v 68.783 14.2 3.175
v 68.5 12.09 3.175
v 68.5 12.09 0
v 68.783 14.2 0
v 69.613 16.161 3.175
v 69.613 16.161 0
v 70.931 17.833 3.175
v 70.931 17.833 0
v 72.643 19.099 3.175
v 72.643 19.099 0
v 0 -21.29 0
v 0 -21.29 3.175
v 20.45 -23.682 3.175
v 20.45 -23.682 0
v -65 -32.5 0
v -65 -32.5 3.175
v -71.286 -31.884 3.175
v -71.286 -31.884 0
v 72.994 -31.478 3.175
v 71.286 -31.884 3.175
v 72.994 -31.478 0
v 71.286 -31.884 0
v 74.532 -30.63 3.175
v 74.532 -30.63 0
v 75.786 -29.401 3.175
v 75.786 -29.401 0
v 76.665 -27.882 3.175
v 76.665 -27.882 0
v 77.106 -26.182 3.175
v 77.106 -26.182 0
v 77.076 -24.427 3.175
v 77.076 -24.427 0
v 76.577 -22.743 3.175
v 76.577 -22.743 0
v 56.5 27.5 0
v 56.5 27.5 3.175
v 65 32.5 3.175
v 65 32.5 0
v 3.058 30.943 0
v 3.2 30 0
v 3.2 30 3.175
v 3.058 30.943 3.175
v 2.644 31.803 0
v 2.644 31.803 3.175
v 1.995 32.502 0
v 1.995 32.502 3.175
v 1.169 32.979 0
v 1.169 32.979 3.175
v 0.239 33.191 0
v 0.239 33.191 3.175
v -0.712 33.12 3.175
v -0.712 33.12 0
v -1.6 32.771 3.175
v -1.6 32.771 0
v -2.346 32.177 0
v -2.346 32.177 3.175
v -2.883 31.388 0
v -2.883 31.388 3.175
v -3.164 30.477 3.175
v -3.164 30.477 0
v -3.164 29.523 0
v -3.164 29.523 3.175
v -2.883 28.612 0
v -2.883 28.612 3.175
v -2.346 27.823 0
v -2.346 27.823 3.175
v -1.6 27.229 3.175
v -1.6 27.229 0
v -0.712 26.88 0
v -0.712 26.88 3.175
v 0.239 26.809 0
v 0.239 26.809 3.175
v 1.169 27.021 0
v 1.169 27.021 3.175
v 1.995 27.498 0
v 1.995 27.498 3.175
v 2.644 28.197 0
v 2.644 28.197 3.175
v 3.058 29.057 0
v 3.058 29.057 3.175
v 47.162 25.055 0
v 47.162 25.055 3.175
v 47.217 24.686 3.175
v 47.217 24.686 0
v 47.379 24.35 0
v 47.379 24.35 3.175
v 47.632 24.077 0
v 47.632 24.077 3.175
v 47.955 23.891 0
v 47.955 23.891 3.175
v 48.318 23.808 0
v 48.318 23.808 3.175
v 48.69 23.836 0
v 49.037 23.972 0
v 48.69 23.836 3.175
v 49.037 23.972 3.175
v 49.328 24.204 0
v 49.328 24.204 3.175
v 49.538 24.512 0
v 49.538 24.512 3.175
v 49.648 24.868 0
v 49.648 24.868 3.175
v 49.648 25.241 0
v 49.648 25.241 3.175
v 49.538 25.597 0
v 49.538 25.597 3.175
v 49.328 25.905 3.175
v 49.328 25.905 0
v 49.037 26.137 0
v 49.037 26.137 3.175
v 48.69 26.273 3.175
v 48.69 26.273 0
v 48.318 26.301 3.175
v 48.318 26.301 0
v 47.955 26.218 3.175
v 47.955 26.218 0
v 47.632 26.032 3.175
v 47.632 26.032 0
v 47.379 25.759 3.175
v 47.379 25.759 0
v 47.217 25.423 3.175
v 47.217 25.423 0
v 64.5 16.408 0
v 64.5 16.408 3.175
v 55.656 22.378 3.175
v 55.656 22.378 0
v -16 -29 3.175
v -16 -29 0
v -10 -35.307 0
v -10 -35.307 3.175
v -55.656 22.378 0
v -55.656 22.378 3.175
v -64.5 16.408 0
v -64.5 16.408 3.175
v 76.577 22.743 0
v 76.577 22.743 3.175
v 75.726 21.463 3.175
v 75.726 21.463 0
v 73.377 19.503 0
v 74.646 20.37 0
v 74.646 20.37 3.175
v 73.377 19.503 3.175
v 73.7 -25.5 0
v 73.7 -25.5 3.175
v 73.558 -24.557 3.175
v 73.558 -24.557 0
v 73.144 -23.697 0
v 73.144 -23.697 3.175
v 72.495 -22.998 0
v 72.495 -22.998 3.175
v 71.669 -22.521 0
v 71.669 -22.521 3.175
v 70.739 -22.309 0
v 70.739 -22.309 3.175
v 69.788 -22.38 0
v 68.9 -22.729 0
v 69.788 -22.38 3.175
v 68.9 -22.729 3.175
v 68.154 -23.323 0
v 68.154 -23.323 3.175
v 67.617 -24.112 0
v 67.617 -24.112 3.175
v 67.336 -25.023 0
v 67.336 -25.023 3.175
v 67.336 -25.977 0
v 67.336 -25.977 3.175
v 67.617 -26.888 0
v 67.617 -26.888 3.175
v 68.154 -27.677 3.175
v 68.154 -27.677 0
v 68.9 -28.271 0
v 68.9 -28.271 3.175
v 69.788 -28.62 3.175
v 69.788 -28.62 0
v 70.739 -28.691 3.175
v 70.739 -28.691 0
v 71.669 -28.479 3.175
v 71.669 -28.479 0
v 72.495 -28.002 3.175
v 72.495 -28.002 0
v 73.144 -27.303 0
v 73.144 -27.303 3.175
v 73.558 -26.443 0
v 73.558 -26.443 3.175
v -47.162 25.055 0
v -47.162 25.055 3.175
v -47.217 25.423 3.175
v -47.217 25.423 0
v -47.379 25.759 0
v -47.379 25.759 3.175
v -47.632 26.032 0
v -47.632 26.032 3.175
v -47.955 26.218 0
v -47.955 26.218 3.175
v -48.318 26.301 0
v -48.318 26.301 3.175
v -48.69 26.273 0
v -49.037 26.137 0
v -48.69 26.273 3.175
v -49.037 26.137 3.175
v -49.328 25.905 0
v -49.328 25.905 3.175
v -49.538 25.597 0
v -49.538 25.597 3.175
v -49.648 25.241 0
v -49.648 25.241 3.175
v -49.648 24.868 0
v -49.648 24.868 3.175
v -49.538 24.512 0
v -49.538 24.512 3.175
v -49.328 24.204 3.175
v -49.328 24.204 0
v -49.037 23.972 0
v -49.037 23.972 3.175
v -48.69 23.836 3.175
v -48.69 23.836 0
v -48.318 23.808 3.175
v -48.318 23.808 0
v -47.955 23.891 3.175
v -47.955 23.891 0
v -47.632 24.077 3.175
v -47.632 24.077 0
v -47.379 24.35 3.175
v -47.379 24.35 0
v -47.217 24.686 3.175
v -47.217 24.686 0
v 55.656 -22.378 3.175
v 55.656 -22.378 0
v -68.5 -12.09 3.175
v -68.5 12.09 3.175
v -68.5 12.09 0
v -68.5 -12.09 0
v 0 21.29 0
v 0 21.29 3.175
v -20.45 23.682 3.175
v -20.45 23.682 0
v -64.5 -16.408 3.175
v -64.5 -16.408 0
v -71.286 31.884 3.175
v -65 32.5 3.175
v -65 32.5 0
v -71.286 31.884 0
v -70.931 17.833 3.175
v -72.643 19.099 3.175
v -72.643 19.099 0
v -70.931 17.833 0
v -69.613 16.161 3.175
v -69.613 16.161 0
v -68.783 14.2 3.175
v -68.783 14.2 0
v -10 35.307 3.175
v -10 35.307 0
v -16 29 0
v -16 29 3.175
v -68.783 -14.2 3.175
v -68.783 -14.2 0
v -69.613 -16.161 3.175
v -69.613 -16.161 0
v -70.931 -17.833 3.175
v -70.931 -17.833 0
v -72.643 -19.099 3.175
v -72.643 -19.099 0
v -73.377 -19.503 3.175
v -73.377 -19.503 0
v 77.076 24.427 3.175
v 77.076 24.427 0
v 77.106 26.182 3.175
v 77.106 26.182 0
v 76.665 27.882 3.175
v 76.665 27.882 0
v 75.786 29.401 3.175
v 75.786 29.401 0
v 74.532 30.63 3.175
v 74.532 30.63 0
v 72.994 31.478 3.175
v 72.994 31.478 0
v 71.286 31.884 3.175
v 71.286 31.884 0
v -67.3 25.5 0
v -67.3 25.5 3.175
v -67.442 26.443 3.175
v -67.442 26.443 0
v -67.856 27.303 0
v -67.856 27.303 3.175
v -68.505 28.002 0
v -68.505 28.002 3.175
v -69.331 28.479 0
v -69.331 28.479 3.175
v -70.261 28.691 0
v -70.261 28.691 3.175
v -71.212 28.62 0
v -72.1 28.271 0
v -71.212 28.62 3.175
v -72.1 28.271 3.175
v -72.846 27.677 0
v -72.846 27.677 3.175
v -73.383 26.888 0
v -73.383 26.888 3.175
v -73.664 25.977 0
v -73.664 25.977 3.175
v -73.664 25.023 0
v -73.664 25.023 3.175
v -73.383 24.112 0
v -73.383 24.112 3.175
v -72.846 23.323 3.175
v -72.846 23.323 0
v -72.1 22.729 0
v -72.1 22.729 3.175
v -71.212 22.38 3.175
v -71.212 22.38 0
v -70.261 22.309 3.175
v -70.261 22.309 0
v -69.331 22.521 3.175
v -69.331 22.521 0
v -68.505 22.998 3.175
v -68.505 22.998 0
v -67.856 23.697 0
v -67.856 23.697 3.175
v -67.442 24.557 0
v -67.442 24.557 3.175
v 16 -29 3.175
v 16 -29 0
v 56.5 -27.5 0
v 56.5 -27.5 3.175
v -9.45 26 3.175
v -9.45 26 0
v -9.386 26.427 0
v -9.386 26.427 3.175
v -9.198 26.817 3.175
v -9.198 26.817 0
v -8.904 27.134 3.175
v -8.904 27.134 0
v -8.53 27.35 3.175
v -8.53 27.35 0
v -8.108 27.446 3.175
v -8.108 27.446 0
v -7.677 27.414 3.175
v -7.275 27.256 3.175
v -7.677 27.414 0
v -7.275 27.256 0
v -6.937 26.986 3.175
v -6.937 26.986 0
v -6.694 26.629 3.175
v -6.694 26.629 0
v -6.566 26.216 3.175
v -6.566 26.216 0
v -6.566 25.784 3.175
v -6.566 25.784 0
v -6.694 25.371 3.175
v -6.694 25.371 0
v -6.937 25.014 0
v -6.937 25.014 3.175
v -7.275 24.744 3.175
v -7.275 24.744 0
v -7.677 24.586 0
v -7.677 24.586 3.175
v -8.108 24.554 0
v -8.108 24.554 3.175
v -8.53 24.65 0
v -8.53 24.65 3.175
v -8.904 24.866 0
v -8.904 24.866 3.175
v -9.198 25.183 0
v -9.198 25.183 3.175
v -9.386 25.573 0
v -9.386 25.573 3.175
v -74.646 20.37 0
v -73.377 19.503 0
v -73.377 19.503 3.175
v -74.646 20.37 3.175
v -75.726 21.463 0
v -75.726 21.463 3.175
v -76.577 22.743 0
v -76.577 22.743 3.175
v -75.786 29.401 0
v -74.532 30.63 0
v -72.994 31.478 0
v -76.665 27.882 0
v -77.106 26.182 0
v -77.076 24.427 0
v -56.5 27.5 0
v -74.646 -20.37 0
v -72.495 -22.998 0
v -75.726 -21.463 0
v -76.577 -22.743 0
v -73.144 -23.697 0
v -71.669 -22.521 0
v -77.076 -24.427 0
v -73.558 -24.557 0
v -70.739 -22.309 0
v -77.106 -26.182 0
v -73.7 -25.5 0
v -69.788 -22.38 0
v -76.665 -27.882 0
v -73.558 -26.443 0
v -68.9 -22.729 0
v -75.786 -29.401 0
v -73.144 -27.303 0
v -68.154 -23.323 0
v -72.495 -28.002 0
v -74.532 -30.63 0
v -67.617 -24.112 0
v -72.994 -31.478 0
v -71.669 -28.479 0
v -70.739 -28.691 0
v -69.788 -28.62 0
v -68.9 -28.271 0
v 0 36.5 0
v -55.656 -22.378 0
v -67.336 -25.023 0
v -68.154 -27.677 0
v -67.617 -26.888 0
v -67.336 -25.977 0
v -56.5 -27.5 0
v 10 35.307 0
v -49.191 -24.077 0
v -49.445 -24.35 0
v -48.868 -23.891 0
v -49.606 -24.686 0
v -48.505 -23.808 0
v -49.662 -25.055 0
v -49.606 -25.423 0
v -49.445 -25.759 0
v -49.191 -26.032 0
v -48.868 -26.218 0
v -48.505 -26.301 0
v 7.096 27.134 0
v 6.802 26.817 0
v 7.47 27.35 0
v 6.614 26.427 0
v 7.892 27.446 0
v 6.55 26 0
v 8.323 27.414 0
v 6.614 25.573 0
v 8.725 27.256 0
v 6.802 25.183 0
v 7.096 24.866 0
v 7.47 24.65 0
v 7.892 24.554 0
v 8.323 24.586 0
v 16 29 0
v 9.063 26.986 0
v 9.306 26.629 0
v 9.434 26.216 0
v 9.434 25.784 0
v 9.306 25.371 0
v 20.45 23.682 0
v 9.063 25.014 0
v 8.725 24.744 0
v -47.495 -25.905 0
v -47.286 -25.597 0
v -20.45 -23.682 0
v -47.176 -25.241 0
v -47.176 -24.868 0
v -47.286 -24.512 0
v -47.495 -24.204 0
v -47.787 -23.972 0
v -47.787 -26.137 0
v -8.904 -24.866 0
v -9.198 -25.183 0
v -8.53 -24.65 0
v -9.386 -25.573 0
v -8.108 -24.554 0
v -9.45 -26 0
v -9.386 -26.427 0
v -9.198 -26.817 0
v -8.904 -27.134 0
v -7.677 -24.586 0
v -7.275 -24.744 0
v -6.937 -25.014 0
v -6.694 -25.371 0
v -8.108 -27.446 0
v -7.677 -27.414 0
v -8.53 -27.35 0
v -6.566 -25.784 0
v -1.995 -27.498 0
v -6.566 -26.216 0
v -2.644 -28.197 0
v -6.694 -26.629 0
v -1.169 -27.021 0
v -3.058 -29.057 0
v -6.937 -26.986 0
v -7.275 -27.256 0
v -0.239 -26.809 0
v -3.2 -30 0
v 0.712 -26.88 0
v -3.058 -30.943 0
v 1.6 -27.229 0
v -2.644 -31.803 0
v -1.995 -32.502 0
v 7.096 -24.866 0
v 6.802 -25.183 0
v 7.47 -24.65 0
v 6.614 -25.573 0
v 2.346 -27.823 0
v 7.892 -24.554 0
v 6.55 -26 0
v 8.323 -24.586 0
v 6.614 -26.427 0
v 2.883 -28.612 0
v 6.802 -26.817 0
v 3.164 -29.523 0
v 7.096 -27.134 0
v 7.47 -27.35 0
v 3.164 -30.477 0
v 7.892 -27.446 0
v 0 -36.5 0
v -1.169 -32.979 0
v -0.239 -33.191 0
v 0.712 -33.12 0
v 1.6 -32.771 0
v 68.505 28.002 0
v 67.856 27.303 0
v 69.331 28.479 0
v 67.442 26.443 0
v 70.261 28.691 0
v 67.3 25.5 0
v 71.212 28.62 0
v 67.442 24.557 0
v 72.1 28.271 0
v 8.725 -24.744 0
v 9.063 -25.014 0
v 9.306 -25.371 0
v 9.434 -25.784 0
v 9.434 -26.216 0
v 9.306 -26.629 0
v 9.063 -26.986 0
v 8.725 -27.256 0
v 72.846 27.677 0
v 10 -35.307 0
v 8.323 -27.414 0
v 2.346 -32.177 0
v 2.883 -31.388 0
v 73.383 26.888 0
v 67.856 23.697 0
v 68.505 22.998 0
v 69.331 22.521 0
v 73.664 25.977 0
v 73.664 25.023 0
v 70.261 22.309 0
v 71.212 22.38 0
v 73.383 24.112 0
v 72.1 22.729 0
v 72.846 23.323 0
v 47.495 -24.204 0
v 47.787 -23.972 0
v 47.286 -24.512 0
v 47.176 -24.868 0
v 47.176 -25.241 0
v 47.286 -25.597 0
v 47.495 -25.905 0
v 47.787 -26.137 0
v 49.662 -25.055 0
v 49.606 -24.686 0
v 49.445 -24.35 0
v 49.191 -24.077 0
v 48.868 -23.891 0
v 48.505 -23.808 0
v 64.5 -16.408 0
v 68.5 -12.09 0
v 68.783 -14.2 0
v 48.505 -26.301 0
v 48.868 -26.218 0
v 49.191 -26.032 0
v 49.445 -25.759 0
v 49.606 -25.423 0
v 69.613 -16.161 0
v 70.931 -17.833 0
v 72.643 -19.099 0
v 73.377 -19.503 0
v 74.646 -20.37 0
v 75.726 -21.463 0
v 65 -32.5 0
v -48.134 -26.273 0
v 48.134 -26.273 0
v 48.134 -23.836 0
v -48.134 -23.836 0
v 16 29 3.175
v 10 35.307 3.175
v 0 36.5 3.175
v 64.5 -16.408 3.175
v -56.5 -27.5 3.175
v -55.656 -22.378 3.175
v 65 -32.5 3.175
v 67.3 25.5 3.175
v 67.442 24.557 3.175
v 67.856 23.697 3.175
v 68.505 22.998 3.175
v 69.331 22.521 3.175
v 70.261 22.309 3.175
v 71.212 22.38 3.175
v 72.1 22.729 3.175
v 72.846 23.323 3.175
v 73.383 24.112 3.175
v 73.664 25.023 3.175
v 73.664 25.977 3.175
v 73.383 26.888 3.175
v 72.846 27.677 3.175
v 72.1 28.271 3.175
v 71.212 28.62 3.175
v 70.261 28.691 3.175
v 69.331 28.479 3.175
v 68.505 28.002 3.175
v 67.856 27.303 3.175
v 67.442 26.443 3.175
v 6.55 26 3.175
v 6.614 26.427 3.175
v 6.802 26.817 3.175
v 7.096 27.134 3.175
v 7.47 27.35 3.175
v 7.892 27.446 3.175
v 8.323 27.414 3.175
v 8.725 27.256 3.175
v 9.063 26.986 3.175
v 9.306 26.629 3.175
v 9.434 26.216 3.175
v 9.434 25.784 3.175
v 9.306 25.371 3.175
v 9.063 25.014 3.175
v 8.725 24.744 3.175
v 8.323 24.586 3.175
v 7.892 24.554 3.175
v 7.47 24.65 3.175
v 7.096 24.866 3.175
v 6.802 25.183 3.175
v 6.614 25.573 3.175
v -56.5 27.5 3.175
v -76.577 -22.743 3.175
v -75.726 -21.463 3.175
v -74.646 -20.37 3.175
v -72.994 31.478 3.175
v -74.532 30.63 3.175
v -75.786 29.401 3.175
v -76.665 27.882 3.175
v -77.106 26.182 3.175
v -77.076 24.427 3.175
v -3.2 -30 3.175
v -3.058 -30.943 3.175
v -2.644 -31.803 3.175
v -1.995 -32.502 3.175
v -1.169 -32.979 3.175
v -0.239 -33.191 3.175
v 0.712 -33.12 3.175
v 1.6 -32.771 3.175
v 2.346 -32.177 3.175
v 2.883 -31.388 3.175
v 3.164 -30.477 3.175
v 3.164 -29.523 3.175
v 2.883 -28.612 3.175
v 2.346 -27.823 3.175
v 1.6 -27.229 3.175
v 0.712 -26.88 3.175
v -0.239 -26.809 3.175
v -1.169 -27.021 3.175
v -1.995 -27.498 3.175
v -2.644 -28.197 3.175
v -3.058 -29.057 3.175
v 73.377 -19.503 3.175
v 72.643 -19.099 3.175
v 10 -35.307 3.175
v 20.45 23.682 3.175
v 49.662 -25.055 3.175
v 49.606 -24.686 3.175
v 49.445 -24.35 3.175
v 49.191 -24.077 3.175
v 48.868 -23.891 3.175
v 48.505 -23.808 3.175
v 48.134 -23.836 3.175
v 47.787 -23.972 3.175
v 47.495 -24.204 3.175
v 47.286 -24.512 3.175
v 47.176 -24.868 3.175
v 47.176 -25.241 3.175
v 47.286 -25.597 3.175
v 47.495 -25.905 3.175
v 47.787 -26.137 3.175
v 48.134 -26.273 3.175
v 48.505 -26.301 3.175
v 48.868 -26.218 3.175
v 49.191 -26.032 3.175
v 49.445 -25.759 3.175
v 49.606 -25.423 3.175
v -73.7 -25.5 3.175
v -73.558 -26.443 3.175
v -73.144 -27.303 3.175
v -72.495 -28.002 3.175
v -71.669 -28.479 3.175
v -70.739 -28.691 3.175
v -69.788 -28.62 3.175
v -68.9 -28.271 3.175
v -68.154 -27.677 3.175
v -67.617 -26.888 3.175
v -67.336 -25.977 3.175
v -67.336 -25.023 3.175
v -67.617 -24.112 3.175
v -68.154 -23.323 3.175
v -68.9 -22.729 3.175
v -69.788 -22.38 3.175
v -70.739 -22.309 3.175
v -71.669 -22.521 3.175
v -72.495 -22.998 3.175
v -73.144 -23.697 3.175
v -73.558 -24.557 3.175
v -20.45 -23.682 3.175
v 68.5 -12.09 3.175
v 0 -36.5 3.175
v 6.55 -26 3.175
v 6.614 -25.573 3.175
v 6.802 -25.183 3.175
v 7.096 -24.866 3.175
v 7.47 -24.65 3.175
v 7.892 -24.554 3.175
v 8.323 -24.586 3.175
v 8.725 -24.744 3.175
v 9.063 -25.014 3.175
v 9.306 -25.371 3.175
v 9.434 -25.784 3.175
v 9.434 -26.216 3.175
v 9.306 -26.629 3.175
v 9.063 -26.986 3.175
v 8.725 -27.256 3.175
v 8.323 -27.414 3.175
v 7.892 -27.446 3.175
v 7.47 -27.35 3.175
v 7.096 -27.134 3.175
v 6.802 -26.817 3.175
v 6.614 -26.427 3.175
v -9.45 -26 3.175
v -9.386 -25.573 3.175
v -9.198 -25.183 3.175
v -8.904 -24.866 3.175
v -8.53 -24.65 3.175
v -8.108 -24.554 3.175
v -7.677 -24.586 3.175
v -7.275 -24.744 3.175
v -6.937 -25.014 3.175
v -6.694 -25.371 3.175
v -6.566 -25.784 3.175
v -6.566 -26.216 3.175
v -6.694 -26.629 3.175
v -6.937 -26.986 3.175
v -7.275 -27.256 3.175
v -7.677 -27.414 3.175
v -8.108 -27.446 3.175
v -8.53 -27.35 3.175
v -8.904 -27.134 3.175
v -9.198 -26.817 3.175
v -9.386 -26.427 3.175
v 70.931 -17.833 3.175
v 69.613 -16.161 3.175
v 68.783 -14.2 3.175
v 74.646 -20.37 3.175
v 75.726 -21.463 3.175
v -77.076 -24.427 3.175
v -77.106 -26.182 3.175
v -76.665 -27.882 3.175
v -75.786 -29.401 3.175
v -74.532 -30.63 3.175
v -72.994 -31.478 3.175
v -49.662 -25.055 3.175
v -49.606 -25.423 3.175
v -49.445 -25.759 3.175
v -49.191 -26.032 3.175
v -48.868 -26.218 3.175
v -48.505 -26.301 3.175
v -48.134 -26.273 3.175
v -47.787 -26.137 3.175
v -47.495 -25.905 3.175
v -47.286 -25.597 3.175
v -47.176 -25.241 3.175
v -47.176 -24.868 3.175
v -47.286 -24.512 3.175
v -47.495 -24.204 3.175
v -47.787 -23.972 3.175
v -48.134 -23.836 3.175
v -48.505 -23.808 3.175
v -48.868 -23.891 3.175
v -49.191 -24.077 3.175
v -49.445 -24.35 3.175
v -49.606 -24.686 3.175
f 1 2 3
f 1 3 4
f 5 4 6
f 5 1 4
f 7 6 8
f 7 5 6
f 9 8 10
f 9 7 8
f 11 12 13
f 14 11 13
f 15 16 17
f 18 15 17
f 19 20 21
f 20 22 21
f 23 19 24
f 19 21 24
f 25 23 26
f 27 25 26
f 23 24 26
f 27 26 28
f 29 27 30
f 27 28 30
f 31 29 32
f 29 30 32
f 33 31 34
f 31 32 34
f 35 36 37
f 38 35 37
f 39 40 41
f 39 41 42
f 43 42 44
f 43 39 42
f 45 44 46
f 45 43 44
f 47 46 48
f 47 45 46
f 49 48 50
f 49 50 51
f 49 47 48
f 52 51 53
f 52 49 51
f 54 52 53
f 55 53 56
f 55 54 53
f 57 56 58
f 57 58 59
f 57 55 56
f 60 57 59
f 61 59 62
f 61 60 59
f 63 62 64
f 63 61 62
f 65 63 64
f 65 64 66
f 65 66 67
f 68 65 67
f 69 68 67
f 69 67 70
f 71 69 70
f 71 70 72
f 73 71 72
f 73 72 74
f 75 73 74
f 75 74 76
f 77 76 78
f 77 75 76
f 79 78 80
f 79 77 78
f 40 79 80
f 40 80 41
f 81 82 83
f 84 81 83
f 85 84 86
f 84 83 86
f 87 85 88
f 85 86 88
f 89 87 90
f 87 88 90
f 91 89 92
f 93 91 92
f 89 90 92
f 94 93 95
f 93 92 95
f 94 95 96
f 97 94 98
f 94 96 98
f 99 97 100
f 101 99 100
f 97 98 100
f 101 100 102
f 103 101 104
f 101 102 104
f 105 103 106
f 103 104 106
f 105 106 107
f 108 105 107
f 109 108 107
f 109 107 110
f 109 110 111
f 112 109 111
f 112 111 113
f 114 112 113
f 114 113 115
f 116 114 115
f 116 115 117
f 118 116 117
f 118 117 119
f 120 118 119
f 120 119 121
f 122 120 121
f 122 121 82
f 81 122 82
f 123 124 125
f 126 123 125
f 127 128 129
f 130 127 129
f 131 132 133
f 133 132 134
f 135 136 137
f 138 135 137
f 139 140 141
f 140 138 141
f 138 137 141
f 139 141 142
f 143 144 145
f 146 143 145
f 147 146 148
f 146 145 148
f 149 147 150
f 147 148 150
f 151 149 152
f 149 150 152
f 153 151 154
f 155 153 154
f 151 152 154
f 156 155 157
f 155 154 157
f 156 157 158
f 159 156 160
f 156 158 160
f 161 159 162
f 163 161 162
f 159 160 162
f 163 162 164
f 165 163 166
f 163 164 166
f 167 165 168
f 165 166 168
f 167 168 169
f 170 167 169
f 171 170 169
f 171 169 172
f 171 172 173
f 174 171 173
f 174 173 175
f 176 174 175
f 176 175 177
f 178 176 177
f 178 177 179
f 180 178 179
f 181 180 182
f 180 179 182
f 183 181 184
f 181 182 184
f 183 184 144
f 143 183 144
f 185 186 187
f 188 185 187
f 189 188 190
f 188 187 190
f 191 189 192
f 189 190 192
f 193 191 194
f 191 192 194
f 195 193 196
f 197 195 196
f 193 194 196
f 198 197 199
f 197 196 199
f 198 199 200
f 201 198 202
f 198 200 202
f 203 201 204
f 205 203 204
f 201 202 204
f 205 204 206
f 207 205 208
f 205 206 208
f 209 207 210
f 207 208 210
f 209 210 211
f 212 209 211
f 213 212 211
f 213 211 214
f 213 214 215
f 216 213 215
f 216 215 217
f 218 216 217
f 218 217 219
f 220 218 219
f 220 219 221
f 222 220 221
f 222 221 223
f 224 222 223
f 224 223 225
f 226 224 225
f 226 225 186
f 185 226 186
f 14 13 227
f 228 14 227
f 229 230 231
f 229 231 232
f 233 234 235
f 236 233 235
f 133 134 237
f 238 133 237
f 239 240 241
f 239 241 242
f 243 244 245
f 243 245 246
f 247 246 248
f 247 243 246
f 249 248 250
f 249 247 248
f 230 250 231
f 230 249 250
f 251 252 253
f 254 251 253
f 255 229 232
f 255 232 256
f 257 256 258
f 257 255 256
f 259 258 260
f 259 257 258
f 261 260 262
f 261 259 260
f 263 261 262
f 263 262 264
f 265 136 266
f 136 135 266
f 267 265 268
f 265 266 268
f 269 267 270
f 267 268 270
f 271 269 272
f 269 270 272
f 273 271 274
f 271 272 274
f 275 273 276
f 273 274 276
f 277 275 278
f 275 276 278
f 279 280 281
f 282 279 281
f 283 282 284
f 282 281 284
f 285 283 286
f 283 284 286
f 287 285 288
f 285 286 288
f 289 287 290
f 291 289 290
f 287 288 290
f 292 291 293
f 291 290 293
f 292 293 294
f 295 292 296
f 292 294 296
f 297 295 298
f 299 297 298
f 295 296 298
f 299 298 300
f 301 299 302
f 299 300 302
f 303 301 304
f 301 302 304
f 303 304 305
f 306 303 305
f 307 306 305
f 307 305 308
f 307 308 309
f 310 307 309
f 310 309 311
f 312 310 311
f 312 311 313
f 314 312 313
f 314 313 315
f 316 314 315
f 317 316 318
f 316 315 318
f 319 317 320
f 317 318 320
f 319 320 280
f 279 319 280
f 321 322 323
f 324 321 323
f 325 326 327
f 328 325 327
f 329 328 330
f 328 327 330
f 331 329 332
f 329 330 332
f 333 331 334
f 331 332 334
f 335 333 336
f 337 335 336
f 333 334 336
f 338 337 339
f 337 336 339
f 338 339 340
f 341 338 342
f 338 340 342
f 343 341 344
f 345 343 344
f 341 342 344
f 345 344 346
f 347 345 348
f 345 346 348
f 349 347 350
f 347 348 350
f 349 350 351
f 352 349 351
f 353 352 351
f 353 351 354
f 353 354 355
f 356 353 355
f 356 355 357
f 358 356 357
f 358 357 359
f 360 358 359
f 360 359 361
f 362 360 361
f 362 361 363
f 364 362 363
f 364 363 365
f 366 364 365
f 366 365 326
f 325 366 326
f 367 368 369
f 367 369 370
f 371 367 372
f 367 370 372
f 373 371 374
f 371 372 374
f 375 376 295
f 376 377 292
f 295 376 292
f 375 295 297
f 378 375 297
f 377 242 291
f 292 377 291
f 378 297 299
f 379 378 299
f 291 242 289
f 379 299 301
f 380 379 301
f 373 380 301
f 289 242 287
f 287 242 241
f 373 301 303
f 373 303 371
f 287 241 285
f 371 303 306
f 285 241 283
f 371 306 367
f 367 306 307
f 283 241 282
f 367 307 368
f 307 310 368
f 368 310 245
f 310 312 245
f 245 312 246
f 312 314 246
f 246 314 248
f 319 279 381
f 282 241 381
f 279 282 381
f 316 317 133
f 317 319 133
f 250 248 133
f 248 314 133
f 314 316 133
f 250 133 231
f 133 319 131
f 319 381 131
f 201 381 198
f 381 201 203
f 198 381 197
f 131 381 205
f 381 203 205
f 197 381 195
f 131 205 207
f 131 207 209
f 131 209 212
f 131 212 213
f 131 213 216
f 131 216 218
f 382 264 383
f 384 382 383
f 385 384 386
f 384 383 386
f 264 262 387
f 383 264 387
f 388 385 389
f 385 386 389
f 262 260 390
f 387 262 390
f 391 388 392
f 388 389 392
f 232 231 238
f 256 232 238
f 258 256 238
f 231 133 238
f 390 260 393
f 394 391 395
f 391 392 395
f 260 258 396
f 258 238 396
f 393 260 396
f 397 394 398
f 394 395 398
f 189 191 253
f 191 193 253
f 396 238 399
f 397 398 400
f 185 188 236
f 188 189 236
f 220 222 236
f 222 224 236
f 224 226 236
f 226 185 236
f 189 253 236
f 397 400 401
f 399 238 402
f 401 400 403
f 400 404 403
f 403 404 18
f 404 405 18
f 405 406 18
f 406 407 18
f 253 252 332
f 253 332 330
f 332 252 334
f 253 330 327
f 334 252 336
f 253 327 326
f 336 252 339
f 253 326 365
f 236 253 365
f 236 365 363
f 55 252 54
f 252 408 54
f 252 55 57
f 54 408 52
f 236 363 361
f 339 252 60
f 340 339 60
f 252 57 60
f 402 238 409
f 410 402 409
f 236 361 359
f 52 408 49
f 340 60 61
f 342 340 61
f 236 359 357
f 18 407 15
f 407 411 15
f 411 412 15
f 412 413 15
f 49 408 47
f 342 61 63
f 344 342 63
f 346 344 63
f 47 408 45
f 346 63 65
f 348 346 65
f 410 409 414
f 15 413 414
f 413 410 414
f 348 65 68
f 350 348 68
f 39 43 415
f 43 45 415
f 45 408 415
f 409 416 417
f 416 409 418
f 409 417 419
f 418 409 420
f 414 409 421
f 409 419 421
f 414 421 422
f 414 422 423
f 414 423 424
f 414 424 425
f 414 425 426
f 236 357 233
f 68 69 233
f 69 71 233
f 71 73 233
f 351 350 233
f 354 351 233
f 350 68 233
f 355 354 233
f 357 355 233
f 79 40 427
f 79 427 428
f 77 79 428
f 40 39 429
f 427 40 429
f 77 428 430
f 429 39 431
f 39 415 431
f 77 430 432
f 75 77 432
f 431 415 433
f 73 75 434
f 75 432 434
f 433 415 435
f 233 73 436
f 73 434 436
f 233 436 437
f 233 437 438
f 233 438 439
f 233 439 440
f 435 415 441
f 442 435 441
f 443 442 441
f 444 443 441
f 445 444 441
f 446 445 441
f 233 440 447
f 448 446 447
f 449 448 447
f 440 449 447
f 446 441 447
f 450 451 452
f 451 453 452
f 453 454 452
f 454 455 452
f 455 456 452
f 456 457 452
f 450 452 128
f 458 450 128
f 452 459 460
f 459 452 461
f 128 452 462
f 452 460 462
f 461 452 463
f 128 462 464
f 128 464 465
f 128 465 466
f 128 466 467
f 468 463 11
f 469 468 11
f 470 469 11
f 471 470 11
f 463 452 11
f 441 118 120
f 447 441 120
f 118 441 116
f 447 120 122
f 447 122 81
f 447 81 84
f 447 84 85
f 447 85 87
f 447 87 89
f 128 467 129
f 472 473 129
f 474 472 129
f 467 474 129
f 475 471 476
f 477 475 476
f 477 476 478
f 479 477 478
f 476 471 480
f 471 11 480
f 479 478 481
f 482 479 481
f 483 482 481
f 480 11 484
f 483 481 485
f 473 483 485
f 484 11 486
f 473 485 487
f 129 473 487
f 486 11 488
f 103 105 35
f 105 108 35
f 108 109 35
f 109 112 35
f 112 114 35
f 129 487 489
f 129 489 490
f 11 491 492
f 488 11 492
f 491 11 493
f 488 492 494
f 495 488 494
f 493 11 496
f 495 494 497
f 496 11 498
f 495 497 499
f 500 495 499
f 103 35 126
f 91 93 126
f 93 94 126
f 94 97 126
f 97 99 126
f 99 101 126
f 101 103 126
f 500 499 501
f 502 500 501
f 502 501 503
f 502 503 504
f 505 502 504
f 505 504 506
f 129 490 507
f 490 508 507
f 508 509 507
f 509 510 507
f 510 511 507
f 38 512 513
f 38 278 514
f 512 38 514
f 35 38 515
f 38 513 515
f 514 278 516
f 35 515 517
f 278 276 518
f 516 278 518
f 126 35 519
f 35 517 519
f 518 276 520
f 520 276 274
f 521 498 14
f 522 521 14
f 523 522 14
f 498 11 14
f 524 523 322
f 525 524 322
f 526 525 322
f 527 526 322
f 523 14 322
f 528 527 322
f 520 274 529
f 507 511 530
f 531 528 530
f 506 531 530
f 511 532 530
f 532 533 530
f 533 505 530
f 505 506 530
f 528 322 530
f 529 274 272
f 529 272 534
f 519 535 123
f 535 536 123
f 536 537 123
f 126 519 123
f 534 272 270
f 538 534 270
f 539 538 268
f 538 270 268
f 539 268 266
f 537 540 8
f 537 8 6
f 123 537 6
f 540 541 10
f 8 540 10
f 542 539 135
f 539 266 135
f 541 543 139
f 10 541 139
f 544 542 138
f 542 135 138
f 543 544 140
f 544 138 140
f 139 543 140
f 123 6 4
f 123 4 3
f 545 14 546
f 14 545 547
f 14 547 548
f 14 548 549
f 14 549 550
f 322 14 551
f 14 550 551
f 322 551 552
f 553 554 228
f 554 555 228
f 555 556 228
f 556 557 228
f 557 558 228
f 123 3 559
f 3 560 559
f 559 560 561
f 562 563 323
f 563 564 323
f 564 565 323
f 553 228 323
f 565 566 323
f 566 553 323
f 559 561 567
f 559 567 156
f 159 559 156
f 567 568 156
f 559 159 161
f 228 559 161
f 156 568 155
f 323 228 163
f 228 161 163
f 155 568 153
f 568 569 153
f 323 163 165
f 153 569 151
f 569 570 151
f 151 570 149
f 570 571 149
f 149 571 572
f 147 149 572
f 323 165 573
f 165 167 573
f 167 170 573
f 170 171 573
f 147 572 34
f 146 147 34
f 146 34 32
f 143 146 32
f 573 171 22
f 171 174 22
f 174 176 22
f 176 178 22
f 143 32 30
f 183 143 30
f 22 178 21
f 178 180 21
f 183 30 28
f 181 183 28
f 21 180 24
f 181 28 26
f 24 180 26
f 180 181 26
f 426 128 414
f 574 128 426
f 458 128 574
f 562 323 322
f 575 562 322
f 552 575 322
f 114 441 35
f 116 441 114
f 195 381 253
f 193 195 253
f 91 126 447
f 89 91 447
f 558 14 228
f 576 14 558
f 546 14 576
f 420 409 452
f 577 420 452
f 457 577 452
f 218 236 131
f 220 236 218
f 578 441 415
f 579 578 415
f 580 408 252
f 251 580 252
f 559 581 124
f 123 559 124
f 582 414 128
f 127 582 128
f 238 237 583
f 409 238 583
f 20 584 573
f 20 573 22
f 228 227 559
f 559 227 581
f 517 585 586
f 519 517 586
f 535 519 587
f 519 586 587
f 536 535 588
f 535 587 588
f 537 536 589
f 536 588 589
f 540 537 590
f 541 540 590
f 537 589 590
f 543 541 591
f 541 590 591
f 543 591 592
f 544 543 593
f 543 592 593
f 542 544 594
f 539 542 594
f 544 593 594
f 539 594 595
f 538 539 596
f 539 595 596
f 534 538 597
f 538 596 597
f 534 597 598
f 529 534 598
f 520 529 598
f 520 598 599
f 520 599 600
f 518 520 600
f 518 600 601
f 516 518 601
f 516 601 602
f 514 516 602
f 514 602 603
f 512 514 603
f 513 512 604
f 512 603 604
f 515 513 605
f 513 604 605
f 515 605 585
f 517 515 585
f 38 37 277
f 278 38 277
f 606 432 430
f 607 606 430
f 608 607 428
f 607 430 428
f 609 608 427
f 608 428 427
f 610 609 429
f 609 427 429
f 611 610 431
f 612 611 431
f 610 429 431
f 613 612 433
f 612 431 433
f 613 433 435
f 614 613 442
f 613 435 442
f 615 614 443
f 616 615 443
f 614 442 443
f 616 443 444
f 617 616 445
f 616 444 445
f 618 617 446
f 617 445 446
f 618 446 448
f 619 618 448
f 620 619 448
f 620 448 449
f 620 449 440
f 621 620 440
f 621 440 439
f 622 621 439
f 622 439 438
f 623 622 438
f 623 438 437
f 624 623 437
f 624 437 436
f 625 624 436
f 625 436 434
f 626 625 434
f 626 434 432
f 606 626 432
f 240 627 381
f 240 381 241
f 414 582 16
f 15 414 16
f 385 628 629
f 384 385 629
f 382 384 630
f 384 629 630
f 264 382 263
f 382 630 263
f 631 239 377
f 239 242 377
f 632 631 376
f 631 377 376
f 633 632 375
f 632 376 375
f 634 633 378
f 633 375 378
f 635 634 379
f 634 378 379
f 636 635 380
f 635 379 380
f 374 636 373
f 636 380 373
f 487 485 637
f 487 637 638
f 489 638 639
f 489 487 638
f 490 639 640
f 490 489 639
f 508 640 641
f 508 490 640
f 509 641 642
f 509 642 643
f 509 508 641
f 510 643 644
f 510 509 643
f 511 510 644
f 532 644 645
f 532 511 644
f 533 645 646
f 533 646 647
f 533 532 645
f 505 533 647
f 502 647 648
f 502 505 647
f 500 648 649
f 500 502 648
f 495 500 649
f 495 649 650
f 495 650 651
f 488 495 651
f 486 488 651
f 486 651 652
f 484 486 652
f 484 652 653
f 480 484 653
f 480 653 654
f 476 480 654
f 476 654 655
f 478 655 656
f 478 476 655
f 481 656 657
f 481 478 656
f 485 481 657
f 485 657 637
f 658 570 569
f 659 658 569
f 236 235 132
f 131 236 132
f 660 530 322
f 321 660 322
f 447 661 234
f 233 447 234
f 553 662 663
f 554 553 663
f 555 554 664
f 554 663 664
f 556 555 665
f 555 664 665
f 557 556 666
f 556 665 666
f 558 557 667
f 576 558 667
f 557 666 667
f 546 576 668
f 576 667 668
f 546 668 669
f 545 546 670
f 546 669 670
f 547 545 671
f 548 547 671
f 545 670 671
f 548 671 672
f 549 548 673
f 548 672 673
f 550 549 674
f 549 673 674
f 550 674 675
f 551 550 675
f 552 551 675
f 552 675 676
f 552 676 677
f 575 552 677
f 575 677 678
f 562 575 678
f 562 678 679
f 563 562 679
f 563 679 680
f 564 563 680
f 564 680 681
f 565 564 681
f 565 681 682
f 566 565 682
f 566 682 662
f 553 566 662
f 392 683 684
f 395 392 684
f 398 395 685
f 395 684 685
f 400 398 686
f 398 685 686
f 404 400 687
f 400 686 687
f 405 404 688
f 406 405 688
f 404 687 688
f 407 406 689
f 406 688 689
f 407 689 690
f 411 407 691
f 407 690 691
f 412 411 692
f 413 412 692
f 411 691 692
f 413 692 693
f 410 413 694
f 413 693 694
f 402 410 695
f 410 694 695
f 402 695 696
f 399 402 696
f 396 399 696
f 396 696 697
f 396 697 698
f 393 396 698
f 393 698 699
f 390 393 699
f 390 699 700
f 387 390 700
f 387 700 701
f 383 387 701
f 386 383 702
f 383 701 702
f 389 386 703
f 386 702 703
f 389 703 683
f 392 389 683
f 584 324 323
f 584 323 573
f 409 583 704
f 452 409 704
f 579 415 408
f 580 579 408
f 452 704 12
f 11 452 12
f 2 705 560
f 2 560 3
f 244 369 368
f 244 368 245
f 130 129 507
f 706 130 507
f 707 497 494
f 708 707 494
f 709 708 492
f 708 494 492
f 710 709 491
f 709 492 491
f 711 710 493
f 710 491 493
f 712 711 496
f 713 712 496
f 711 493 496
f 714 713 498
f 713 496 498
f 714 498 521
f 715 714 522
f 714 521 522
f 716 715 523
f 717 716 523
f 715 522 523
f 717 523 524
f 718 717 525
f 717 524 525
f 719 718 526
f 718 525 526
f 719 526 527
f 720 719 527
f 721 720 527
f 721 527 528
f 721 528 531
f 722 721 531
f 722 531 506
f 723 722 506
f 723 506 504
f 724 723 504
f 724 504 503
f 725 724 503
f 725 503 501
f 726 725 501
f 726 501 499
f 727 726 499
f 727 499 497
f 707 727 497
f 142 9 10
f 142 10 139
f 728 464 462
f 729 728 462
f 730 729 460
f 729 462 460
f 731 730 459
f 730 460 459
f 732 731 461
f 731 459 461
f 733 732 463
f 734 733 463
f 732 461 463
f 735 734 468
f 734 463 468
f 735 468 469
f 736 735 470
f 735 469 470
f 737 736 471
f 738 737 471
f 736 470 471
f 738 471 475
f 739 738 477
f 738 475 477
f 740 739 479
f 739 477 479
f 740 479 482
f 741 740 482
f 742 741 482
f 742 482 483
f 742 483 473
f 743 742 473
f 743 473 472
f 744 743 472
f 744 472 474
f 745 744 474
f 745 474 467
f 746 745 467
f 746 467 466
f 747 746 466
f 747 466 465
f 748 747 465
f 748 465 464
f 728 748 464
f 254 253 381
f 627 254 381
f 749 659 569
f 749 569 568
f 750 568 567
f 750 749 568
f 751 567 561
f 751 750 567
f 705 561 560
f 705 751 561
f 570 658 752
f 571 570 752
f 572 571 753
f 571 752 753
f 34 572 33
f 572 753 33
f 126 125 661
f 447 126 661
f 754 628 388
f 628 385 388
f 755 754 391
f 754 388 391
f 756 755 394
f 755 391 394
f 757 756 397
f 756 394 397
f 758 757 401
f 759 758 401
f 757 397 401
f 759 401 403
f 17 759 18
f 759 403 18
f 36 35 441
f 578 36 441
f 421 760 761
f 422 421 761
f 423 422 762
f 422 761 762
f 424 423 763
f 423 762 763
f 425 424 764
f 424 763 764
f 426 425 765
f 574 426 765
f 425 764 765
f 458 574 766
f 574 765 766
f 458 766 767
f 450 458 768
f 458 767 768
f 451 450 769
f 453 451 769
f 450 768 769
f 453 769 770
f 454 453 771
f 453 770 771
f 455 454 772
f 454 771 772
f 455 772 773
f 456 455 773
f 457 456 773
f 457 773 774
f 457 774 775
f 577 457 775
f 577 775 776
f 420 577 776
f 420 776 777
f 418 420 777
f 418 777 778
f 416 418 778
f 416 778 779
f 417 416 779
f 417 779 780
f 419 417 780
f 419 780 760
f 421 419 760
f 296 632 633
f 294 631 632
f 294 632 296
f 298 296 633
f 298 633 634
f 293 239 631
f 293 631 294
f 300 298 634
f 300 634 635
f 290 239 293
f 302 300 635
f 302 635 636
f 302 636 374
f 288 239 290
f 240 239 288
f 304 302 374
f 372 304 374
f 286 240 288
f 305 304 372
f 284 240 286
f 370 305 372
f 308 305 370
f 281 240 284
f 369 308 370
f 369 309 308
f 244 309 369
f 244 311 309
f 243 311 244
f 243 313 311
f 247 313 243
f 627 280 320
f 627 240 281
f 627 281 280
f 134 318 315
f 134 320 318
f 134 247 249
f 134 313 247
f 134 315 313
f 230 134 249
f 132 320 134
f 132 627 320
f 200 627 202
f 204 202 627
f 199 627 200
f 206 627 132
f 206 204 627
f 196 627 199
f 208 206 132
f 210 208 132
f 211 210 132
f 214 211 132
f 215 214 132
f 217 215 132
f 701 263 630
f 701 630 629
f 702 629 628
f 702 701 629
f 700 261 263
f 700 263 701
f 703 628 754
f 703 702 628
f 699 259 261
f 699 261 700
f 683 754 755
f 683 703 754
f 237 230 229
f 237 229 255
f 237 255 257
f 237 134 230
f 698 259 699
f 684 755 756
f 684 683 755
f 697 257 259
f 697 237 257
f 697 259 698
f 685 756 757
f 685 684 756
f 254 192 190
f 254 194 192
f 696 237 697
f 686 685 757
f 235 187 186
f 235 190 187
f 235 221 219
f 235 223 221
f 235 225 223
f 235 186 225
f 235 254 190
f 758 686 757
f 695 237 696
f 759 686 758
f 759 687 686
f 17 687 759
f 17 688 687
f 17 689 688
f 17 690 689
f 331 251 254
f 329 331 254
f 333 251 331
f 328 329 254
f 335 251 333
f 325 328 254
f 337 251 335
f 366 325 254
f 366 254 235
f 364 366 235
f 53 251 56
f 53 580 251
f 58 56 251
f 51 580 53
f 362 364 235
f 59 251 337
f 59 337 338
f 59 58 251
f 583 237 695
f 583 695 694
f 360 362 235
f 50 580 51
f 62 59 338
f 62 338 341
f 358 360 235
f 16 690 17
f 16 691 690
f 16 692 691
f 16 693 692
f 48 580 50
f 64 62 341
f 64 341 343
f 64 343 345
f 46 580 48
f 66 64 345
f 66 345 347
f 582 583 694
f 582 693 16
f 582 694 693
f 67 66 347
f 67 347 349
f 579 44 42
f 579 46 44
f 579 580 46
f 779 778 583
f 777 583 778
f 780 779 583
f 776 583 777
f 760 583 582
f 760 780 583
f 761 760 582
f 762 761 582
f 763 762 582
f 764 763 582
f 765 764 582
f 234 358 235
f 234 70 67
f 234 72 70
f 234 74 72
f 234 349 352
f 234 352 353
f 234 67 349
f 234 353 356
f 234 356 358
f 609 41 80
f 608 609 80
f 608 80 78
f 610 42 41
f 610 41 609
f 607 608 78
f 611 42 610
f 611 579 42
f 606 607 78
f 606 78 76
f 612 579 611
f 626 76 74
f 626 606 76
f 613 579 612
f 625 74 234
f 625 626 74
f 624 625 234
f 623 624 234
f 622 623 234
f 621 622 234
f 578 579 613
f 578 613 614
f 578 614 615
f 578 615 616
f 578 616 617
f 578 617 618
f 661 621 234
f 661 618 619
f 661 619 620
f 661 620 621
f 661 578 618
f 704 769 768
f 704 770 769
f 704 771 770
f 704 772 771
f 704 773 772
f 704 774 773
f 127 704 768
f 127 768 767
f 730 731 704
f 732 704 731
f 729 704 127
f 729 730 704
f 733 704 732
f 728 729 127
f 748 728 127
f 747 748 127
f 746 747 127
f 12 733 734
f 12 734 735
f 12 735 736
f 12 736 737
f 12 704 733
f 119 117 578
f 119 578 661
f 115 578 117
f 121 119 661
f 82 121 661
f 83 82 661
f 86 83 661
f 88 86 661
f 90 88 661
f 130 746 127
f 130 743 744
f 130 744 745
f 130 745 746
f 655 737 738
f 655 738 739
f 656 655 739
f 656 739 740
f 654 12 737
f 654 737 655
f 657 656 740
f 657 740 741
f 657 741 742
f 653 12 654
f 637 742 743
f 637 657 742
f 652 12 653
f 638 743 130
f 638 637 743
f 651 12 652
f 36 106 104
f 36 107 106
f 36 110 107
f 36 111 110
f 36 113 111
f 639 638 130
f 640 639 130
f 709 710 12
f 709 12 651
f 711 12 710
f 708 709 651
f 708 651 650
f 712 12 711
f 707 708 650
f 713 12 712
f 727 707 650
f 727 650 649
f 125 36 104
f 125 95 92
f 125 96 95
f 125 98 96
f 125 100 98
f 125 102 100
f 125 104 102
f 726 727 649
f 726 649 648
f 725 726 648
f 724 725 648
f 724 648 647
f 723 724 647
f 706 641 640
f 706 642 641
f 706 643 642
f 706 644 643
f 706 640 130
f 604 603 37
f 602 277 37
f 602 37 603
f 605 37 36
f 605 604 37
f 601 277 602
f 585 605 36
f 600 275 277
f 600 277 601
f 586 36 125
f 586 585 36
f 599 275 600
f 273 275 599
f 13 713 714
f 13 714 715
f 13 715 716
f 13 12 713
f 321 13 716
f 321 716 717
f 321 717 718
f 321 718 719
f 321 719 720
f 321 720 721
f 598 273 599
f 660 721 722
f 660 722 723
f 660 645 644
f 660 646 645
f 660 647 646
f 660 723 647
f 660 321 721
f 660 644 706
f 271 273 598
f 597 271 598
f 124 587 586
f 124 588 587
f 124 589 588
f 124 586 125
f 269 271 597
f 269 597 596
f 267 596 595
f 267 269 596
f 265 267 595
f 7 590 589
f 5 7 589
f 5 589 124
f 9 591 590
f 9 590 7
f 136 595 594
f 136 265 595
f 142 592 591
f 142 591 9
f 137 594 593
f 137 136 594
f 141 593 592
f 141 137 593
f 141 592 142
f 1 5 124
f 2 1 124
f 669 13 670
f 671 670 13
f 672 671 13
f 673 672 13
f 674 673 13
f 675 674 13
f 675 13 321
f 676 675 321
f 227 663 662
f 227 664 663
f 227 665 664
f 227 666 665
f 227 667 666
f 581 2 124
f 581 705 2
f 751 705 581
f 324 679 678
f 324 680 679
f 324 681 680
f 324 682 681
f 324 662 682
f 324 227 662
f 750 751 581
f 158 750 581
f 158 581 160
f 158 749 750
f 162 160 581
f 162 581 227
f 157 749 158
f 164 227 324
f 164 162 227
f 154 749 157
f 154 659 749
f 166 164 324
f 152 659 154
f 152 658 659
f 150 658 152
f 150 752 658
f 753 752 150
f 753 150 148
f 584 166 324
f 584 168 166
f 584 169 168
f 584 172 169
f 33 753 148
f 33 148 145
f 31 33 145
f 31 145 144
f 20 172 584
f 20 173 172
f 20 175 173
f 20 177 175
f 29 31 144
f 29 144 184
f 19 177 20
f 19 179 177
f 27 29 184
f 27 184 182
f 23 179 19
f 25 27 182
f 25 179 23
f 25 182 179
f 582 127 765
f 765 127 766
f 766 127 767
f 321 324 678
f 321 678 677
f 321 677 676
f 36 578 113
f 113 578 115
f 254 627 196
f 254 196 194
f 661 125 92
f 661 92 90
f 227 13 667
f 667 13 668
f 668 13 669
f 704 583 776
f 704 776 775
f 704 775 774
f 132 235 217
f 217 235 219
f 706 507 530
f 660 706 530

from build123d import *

# Parameters (mm, degrees)
SKETCH1_R           = 3.2
BOSS_EXTRUDE1_DEPTH = 3.175
SKETCH3_R           = 3.2
BOSS_EXTRUDE2_DEPTH = 3.175
FILLET1_R           = 6.5
SKETCH6_R           = 1.45
CUT_EXTRUDE4_DEPTH  = 86.409103367
CUT_EXTRUDE14_DEPTH = 86.409103367
CUT_EXTRUDE13_DEPTH = 86.409103367
FILLET2_R           = 8
SKETCH9_R           = 1.25
CUT_EXTRUDE15_DEPTH = 86.409103367


with BuildPart() as part:
    # Sketch1 → Boss-Extrude1 (new body)
    with BuildSketch(Plane.XY):
        Polygon((0, 36.5), (-10, 35.30709832), (-16, 29), (-56.5, 27.5), (-76.5, 14), (-76.5, -14), (-56.5, -27.5), (-16, -29), (-10, -35.30709832), (0, -36.5), (10, -35.30709832), (16, -29), (56.5, -27.5), (76.5, -14), (76.5, 14), (56.5, 27.5), (16, 29), (10, 35.30709832), align=None)
        with Locations((0, 30)):
            Circle(SKETCH1_R, mode=Mode.SUBTRACT)
        with Locations(Location((0, -30, 0), (0, 0, 180))):
            Circle(SKETCH1_R, mode=Mode.SUBTRACT)
    extrude(amount=BOSS_EXTRUDE1_DEPTH)

    # Sketch3 → Boss-Extrude2 (add)
    # profile 1 of 4: a face of its own
    with BuildSketch(Plane.XY.offset(3.175)):
        Polygon((-56.5, 27.5), (-65, 32.5), (-80.3, 31), (-73.537037037, 16), align=None)
        with Locations((-70.5, 25.5)):
            Circle(SKETCH3_R, mode=Mode.SUBTRACT)
    # profile 2 of 4: a face of its own
    with BuildSketch(Plane.XY.offset(3.175)):
        Polygon((73.537037037, 16), (56.5, 27.5), (65, 32.5), (80.3, 31), align=None)
        with Locations(Location((70.5, 25.5, 0), (0, 0, 180))):
            Circle(SKETCH3_R, mode=Mode.SUBTRACT)
    # profile 3 of 4: a face of its own
    with BuildSketch(Plane.XY.offset(3.175)):
        Polygon((56.5, -27.5), (65, -32.5), (80.3, -31), (73.537037037, -16), align=None)
        with Locations((70.5, -25.5)):
            Circle(SKETCH3_R, mode=Mode.SUBTRACT)
    # profile 4 of 4: a face of its own
    with BuildSketch(Plane.XY.offset(3.175)):
        Polygon((-73.537037037, -16), (-56.5, -27.5), (-65, -32.5), (-80.3, -31), align=None)
        with Locations(Location((-70.5, -25.5, 0), (0, 0, 180))):
            Circle(SKETCH3_R, mode=Mode.SUBTRACT)
    extrude(amount=-BOSS_EXTRUDE2_DEPTH)

    # Fillet1
    fillet1_edges = [part.edges().sort_by_distance(p)[0] for p in [
        (-80.3, 31, 1.5875),
        (80.3, 31, 1.5875),
        (80.3, -31, 1.5875),
        (-80.3, -31, 1.5875),
    ]]
    fillet(fillet1_edges, radius=FILLET1_R)

    # Sketch6 → Cut-Extrude4 (cut, through all)
    with BuildSketch(Plane(origin=(0, 0, 0), x_dir=(-1, 0, 0), z_dir=(0, 0, -1))):
        with Locations((8, 26)):
            Circle(SKETCH6_R)
        with Locations((-8, 26)):
            Circle(SKETCH6_R)
        with Locations((-8, -26)):
            Circle(SKETCH6_R)
        with Locations((8, -26)):
            Circle(SKETCH6_R)
    extrude(amount=-CUT_EXTRUDE4_DEPTH, mode=Mode.SUBTRACT)

    # Sketch8 → Cut-Extrude14 (cut, through all)
    with BuildSketch(Plane.XY.offset(3.175)):
        Polygon((-75.690069736, 20.775346347), (-68.5, 16.819040498), (-68.5, -16.819040498), (-75.690069736, -20.775346347), (-83.497643109, -20.775346347), (-83.497643109, 20.775346347), align=None)
        Polygon((75.690069736, -20.775346347), (68.5, -16.819040498), (68.5, 16.819040498), (75.690069736, 20.775346347), (83.497643109, 20.775346347), (83.497643109, -20.775346347), align=None)
    extrude(amount=-CUT_EXTRUDE14_DEPTH, mode=Mode.SUBTRACT)

    # Sketch7 → Cut-Extrude13 (cut, through all)
    with BuildSketch(Plane.XY.offset(3.175)):
        Polygon((0, 21.290184322), (-20.449646359, 23.681667258), (-55.655570018, 22.377744159), (-64.5, 16.407753921), (-64.5, -16.407753921), (-55.655570018, -22.377744159), (-20.449646359, -23.681667258), (0, -21.290184322), (20.449646359, -23.681667258), (55.655570018, -22.377744159), (64.5, -16.407753921), (64.5, 16.407753921), (55.655570018, 22.377744159), (20.449646359, 23.681667258), align=None)
    extrude(amount=-CUT_EXTRUDE13_DEPTH, mode=Mode.SUBTRACT)

    # Fillet2
    # the kernel refuses this fillet: 8 mm, written as the material it adds along each edge
    with BuildSketch(Plane(origin=(68.5, 16.819040498, 3.175), x_dir=(0.8761249486576493, 0.48208409467605473, 0), z_dir=(0, 0, -1)), Plane(origin=(68.5, -16.819040498, 3.175), x_dir=(0, 1, 0), z_dir=(0, 0, -1))) as fillet2_piece_1:
        with BuildLine():
            CenterArc((FILLET2_R * 0.591143884348, FILLET2_R), FILLET2_R, 208.821606211, 61.178393789)
            Line((-FILLET2_R * 0.284981064309, FILLET2_R * 0.517915905324), (0, 0))
            Line((0, 0), (FILLET2_R * 0.591143884348, 0))
        make_face()
    extrude(amount=3.175)
    with BuildSketch(Plane(origin=(-68.5, -16.819040498, 3.175), x_dir=(0, 1, 0), z_dir=(0, 0, -1)), Plane(origin=(-68.5, 16.819040498, 3.175), x_dir=(-0.8761249486576493, 0.48208409467605473, 0), z_dir=(0, 0, -1))) as fillet2_piece_2:
        with BuildLine():
            CenterArc((FILLET2_R * 0.591143884348, -FILLET2_R), FILLET2_R, 90, 61.178393789)
            Line((-FILLET2_R * 0.284981064309, -FILLET2_R * 0.517915905324), (0, 0))
            Line((0, 0), (FILLET2_R * 0.591143884348, 0))
        make_face()
    extrude(amount=3.175)
    # the kernel refuses this fillet: 8 mm, written as the material it takes off along each edge
    with BuildSketch(Plane(origin=(75.690069736, 20.775346347, 9.774776334), x_dir=(0.4110197276210946, 0.911626449542948, 0), z_dir=(0, 0, -1))) as fillet2_2_piece_1:
        with BuildLine():
            CenterArc((2.693587302, -7.982087138), FILLET2_R, 93.834919038, 33.074566144)
            Line((-2.110833522, -1.585405143), (0, 0))
            Line((0, 0), (2.158531299, 0))
        make_face()
    extrude(amount=16.374552669, mode=Mode.SUBTRACT)
    with BuildSketch(Plane(origin=(75.690069736, -20.775346347, 9.774776334), x_dir=(-0.8761249486576492, 0.48208409467605506, 0), z_dir=(0, 0, -1))) as fillet2_2_piece_2:
        with BuildLine():
            CenterArc((2.639910534, -8), FILLET2_R, 90, 33.074566144)
            Line((-1.725929787, -1.29631159), (0, 0))
            Line((0, 0), (2.639910534, 0))
        make_face()
    extrude(amount=16.374552669, mode=Mode.SUBTRACT)
    with BuildSketch(Plane(origin=(-75.690069736, -20.775346347, 9.774776334), x_dir=(0.8761249486576499, 0.48208409467605357, 0), z_dir=(0, 0, -1))) as fillet2_2_piece_3:
        with BuildLine():
            CenterArc((2.639910534, 8), FILLET2_R, 236.925433856, 33.074566144)
            Line((-1.725929787, 1.29631159), (0, 0))
            Line((0, 0), (2.639910534, 0))
        make_face()
    extrude(amount=16.374552669, mode=Mode.SUBTRACT)
    with BuildSketch(Plane(origin=(-75.690069736, 20.775346347, 9.774776334), x_dir=(-0.4110197276210959, 0.9116264495429475, 0), z_dir=(0, 0, -1))) as fillet2_2_piece_4:
        with BuildLine():
            CenterArc((2.693587302, 7.982087138), FILLET2_R, 233.090514818, 33.074566144)
            Line((-2.110833522, 1.585405143), (0, 0))
            Line((0, 0), (2.158531299, 0))
        make_face()
    extrude(amount=16.374552669, mode=Mode.SUBTRACT)

    # Sketch9 → Cut-Extrude15 (cut, through all)
    with BuildSketch(Plane.XY.offset(3.175)):
        with Locations((-48.411790338, 25.054530897)):
            Circle(SKETCH9_R)
        with Locations(Location((48.411790338, 25.054530897, 0), (0, 0, 180))):
            Circle(SKETCH9_R)
        with Locations(Location((-48.411790338, -25.054530897, 0), (0, 0, 180))):
            Circle(SKETCH9_R)
        with Locations((48.411790338, -25.054530897)):
            Circle(SKETCH9_R)
    extrude(amount=-CUT_EXTRUDE15_DEPTH, mode=Mode.SUBTRACT)


solid = part.part
